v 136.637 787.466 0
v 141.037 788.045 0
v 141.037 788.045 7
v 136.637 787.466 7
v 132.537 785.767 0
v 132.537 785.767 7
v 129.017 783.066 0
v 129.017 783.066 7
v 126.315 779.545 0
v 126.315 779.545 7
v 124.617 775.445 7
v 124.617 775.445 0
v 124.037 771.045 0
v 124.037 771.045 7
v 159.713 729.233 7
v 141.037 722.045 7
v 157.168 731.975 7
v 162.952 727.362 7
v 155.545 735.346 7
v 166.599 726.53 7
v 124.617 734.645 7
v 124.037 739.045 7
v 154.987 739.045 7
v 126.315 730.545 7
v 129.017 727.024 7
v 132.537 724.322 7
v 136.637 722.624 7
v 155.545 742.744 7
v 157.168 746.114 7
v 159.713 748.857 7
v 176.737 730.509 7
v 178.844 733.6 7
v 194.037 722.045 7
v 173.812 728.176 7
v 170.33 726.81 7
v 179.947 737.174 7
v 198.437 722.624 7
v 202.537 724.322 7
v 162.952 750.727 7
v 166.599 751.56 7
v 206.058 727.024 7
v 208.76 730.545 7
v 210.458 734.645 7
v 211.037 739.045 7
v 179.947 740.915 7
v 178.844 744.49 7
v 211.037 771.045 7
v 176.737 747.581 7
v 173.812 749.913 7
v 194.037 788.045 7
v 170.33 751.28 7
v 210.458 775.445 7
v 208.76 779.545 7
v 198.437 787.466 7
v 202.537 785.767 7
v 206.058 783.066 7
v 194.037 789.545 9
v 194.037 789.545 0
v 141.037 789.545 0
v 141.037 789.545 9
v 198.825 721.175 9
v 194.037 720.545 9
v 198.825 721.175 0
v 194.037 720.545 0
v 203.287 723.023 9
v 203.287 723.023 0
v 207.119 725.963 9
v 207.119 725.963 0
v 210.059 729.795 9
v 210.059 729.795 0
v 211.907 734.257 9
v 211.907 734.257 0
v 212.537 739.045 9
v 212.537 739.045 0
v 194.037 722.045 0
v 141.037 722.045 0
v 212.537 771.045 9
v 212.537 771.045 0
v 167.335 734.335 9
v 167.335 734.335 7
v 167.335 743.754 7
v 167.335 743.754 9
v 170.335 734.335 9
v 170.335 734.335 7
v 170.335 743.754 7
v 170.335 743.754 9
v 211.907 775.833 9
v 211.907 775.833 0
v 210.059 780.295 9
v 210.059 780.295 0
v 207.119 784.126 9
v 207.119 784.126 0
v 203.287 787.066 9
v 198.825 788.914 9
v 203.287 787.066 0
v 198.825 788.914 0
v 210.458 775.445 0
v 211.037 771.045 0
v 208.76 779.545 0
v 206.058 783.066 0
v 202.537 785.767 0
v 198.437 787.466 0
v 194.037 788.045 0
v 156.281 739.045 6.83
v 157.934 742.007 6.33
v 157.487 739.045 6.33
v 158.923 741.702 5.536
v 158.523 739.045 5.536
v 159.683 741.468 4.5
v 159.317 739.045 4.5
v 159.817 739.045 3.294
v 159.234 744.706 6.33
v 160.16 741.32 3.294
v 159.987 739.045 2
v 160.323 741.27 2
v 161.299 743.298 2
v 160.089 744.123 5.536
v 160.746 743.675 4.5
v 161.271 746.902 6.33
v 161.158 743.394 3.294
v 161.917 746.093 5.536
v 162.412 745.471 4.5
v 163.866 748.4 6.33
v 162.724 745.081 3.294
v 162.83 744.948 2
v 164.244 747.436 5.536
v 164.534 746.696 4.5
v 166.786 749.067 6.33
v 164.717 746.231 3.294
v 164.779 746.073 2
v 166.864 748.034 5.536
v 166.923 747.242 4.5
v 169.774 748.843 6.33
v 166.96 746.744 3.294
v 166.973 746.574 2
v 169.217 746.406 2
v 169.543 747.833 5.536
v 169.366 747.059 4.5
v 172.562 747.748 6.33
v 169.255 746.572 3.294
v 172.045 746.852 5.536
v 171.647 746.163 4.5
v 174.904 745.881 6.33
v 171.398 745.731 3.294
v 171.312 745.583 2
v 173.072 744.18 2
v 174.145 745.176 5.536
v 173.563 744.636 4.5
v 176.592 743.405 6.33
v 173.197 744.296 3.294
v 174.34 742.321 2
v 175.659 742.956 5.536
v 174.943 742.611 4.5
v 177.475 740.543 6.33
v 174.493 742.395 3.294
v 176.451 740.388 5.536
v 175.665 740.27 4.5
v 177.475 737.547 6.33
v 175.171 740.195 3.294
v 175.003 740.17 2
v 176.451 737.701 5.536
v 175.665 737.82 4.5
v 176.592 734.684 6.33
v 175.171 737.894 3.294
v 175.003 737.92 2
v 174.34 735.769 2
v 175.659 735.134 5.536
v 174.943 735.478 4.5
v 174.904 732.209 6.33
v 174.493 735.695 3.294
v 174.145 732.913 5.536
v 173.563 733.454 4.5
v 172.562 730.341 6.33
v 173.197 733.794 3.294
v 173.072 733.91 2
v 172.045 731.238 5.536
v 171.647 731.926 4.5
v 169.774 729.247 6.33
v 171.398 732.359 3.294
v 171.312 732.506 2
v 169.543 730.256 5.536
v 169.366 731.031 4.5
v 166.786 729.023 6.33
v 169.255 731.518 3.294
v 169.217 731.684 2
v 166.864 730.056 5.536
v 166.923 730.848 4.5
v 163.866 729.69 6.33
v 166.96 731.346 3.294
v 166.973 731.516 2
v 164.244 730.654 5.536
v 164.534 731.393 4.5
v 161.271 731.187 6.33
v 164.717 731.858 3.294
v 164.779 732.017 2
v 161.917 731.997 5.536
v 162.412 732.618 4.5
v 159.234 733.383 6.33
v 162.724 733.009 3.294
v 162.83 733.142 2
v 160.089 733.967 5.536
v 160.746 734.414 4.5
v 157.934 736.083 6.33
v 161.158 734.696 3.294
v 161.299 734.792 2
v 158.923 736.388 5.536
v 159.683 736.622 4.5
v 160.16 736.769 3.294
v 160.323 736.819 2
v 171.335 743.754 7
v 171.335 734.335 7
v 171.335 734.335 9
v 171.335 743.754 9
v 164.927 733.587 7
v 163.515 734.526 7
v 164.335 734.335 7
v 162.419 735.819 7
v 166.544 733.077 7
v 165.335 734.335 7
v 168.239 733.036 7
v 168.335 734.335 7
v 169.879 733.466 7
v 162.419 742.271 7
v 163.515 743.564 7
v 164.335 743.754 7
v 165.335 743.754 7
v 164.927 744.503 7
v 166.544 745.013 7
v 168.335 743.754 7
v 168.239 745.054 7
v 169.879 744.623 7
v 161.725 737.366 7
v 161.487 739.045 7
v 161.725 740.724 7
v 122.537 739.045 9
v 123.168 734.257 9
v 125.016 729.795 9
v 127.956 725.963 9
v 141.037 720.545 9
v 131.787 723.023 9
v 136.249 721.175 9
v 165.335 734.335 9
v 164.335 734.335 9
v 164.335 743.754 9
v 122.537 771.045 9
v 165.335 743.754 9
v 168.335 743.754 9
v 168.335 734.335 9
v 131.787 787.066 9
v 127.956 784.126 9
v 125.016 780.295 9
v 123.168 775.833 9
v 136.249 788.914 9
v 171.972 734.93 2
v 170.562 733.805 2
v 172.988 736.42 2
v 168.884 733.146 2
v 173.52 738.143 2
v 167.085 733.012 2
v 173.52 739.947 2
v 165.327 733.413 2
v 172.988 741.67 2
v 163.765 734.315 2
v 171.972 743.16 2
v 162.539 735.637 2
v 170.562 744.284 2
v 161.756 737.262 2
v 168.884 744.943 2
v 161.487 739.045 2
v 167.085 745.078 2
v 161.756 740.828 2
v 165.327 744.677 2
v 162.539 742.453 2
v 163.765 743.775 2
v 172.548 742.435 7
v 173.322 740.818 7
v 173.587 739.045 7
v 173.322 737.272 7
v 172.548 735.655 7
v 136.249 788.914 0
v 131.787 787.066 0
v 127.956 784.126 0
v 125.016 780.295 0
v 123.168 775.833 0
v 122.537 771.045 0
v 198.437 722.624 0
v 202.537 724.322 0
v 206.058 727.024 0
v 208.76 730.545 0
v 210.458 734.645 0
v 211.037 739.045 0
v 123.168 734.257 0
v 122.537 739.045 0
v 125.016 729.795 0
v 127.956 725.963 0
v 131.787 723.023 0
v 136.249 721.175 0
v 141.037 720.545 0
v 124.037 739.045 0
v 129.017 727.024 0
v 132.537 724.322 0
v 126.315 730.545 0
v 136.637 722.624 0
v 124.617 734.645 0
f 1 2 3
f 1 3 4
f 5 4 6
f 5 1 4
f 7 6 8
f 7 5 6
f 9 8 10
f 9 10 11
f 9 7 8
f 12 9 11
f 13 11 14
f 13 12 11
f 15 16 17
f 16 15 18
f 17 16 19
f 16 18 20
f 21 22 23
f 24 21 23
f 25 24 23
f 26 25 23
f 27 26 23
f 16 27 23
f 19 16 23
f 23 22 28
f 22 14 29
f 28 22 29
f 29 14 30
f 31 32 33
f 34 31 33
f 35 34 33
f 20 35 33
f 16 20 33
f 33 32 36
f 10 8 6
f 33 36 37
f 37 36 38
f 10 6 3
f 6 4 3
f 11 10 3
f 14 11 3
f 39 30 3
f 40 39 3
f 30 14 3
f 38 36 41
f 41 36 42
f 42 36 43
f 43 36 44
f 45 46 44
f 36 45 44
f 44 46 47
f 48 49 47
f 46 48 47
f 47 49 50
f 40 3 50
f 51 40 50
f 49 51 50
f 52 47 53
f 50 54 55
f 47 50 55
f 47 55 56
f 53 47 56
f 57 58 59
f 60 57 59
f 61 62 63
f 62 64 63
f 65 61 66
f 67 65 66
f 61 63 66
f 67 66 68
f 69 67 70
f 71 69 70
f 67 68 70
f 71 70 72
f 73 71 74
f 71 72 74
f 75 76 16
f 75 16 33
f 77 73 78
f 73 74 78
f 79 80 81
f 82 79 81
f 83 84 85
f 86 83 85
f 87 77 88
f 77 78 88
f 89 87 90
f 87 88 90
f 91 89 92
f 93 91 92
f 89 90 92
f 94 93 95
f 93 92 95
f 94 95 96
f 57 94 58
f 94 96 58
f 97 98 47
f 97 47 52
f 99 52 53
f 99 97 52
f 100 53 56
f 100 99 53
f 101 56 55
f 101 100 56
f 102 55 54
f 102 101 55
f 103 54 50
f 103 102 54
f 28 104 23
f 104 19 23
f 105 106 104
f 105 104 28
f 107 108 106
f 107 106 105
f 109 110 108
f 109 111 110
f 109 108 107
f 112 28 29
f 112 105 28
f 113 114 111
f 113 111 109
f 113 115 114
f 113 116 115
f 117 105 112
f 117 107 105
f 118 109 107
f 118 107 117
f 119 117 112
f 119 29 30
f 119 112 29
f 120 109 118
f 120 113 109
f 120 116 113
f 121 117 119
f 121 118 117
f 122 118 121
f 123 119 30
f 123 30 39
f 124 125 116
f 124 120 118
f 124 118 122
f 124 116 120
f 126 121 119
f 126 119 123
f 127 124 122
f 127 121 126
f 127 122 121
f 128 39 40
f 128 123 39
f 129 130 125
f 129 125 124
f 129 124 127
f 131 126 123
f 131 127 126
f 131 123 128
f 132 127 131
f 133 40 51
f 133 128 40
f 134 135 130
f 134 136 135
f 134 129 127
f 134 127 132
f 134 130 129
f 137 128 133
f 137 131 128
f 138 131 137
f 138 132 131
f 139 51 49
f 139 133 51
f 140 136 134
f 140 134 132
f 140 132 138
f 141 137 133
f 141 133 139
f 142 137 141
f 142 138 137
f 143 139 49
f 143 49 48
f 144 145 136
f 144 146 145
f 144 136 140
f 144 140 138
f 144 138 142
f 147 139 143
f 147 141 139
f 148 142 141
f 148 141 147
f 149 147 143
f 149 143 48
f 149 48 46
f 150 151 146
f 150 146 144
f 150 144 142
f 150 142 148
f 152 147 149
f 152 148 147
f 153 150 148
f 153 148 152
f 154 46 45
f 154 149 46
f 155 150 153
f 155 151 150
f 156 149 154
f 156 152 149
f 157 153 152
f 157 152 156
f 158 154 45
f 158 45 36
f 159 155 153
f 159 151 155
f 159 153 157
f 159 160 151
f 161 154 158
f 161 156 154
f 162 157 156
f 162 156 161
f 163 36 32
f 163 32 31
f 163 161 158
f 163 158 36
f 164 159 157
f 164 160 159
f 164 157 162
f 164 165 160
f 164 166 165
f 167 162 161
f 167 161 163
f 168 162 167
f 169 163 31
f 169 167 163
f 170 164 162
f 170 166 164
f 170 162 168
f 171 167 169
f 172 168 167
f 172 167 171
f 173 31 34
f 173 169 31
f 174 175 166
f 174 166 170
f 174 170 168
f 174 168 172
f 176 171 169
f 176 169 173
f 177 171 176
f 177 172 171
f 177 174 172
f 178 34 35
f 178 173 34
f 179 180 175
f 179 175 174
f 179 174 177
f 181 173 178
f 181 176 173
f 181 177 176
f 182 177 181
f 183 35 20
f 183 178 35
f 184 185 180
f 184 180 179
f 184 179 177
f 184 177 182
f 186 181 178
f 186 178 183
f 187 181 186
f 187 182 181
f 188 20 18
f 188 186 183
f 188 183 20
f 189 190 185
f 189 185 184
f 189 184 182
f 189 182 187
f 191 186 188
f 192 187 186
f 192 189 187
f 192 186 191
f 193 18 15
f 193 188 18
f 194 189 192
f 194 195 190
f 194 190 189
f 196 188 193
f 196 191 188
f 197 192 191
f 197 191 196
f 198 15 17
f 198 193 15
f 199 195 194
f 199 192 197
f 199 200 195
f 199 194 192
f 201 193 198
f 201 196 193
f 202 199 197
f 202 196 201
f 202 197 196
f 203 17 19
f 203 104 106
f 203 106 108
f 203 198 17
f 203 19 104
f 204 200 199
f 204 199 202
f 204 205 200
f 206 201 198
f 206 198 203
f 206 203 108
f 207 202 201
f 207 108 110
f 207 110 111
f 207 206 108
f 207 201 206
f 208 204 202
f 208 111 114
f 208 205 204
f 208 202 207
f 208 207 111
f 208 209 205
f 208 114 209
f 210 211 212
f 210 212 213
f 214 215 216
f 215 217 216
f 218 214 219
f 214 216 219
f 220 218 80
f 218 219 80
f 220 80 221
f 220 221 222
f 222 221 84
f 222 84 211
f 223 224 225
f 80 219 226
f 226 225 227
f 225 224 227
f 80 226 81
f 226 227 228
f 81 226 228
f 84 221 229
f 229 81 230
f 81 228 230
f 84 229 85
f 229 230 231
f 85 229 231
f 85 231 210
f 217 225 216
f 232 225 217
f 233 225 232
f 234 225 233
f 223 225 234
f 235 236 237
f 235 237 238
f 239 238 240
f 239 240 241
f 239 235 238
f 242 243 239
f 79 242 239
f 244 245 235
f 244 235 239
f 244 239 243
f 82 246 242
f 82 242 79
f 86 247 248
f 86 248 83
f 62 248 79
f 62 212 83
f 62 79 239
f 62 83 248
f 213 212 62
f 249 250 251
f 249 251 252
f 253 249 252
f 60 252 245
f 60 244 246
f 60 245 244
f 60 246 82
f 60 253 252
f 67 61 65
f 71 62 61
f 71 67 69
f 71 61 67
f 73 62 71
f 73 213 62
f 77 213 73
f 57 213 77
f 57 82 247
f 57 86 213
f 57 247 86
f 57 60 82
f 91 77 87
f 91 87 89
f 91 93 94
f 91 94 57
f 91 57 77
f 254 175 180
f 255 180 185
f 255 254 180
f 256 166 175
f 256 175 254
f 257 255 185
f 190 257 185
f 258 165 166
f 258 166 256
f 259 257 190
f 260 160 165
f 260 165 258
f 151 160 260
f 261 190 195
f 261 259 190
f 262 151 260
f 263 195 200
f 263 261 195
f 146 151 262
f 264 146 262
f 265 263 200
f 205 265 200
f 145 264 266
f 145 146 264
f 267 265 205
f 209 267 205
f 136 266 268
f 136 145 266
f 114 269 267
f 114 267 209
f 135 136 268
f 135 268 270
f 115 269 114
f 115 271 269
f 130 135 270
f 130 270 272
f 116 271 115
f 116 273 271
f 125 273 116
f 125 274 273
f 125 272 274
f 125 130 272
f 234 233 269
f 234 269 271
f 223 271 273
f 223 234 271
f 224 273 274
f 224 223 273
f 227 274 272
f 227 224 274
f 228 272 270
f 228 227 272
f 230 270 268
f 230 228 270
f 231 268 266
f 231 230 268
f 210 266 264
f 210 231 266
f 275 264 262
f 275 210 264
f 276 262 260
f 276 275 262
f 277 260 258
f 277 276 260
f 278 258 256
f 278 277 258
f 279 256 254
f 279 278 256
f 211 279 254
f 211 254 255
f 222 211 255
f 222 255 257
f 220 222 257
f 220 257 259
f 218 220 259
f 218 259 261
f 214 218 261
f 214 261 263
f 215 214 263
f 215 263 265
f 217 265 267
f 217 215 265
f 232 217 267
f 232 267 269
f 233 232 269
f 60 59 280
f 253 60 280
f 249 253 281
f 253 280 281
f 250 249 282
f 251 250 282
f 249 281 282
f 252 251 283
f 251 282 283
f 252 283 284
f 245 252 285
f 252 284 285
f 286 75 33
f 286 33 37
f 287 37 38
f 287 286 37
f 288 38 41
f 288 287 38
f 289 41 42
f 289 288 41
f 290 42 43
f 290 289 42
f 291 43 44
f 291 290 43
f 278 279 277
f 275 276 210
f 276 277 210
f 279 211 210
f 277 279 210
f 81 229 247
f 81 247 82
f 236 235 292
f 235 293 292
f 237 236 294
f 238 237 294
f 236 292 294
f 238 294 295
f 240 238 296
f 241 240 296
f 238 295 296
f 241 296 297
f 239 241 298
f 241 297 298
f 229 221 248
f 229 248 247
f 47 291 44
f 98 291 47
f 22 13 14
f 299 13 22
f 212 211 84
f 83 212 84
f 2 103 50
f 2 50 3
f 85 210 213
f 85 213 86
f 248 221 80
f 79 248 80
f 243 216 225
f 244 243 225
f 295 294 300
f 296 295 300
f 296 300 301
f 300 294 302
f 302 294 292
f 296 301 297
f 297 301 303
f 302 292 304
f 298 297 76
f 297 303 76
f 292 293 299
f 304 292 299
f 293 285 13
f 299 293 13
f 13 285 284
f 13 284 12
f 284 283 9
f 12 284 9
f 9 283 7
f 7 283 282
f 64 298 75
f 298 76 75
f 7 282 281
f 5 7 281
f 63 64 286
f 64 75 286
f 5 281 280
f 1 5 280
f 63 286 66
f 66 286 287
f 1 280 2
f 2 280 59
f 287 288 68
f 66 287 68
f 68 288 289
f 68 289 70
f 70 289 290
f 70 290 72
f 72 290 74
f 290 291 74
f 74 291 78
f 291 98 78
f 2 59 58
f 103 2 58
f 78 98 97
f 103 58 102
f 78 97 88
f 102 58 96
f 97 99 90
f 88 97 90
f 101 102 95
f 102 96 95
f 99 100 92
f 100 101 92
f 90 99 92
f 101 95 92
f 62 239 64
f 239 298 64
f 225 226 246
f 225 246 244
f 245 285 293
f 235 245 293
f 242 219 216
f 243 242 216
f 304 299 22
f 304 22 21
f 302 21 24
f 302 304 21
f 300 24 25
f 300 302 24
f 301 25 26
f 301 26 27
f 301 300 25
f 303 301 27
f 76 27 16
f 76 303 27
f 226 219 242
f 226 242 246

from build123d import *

# Parameters (mm, degrees)
EXTRUDE_THIN1_DEPTH = 7
BOSS_EXTRUDE1_DEPTH = 2
SKETCH3_R           = 7.55
SKETCH3_R_2         = 6.05
EXTRUDE_THIN2_DEPTH = 5
FILLET1_R           = 5
SKETCH4_W           = 1
SKETCH4_H           = 9.419182822
CUT_EXTRUDE1_DEPTH  = 818.680940253


with BuildPart() as part:
    # Sketch1 → Extrude-Thin1 (new body)
    with BuildSketch(Plane.XY):
        with BuildLine():
            Line((122.537316884, 771.044811258), (122.537316884, 739.044811258))
            ThreePointArc((122.537316884, 739.044811258), (127.955841432, 725.963335806), (141.037316884, 720.544811258))
            Line((141.037316884, 720.544811258), (194.037316884, 720.544811258))
            ThreePointArc((194.037316884, 720.544811258), (207.118792336, 725.963335806), (212.537316884, 739.044811258))
            Line((212.537316884, 739.044811258), (212.537316884, 771.044811258))
            ThreePointArc((212.537316884, 771.044811258), (207.118792336, 784.12628671), (194.037316884, 789.544811258))
            Line((194.037316884, 789.544811258), (141.037316884, 789.544811258))
            ThreePointArc((141.037316884, 789.544811258), (127.955841432, 784.12628671), (122.537316884, 771.044811258))
        make_face()
        with BuildLine():
            Line((124.037316884, 771.044811258), (124.037316884, 739.044811258))
            ThreePointArc((124.037316884, 739.044811258), (129.016501604, 727.023995978), (141.037316884, 722.044811258))
            Line((141.037316884, 722.044811258), (194.037316884, 722.044811258))
            ThreePointArc((194.037316884, 722.044811258), (206.058132165, 727.023995978), (211.037316884, 739.044811258))
            Line((211.037316884, 739.044811258), (211.037316884, 771.044811258))
            ThreePointArc((211.037316884, 771.044811258), (206.058132165, 783.065626538), (194.037316884, 788.044811258))
            Line((194.037316884, 788.044811258), (141.037316884, 788.044811258))
            ThreePointArc((141.037316884, 788.044811258), (129.016501604, 783.065626538), (124.037316884, 771.044811258))
        make_face(mode=Mode.SUBTRACT)
    extrude(amount=EXTRUDE_THIN1_DEPTH)

    # Sketch2 → Boss-Extrude1 (add)
    with BuildSketch(Plane.XY.offset(7)):
        with BuildLine():
            Line((122.537316884, 771.044811258), (122.537316884, 739.044811258))
            ThreePointArc((122.537316884, 739.044811258), (127.955841432, 725.963335806), (141.037316884, 720.544811258))
            Line((141.037316884, 720.544811258), (194.037316884, 720.544811258))
            ThreePointArc((194.037316884, 720.544811258), (207.118792336, 725.963335806), (212.537316884, 739.044811258))
            Line((212.537316884, 739.044811258), (212.537316884, 771.044811258))
            ThreePointArc((212.537316884, 771.044811258), (207.118792336, 784.12628671), (194.037316884, 789.544811258))
            Line((194.037316884, 789.544811258), (141.037316884, 789.544811258))
            ThreePointArc((141.037316884, 789.544811258), (127.955841432, 784.12628671), (122.537316884, 771.044811258))
        make_face()
    extrude(amount=BOSS_EXTRUDE1_DEPTH)

    # Sketch3 → Extrude-Thin2 (add)
    with BuildSketch(Plane(origin=(0, 0, 7), x_dir=(-1, 0, 0), z_dir=(0, 0, -1))):
        with Locations((-167.537316884, 739.044811258)):
            Circle(SKETCH3_R)
        with Locations((-167.537316884, 739.044811258)):
            Circle(SKETCH3_R_2, mode=Mode.SUBTRACT)
    extrude(amount=EXTRUDE_THIN2_DEPTH)

    # Fillet1
    fillet1_edges = [part.edges().sort_by_distance(p)[0] for p in [
        (175.087316884, 739.044811258, 7),
    ]]
    fillet(fillet1_edges, radius=FILLET1_R - 0.0001)  # a hair under: the kernel refuses the full size

    # Sketch4 → Cut-Extrude1 (cut, through all)
    with BuildSketch(Plane(origin=(0, 0, 7), x_dir=(-1, 0, 0), z_dir=(0, 0, -1))):
        with Locations((-170.834980474, 739.044811258)):
            Rectangle(SKETCH4_W, SKETCH4_H)
        with Locations((-167.834980474, 739.044811258)):
            Rectangle(SKETCH4_W, SKETCH4_H)
        with Locations((-164.834980474, 739.044811258)):
            Rectangle(SKETCH4_W, SKETCH4_H)
    extrude(amount=-CUT_EXTRUDE1_DEPTH, mode=Mode.SUBTRACT)


solid = part.part
